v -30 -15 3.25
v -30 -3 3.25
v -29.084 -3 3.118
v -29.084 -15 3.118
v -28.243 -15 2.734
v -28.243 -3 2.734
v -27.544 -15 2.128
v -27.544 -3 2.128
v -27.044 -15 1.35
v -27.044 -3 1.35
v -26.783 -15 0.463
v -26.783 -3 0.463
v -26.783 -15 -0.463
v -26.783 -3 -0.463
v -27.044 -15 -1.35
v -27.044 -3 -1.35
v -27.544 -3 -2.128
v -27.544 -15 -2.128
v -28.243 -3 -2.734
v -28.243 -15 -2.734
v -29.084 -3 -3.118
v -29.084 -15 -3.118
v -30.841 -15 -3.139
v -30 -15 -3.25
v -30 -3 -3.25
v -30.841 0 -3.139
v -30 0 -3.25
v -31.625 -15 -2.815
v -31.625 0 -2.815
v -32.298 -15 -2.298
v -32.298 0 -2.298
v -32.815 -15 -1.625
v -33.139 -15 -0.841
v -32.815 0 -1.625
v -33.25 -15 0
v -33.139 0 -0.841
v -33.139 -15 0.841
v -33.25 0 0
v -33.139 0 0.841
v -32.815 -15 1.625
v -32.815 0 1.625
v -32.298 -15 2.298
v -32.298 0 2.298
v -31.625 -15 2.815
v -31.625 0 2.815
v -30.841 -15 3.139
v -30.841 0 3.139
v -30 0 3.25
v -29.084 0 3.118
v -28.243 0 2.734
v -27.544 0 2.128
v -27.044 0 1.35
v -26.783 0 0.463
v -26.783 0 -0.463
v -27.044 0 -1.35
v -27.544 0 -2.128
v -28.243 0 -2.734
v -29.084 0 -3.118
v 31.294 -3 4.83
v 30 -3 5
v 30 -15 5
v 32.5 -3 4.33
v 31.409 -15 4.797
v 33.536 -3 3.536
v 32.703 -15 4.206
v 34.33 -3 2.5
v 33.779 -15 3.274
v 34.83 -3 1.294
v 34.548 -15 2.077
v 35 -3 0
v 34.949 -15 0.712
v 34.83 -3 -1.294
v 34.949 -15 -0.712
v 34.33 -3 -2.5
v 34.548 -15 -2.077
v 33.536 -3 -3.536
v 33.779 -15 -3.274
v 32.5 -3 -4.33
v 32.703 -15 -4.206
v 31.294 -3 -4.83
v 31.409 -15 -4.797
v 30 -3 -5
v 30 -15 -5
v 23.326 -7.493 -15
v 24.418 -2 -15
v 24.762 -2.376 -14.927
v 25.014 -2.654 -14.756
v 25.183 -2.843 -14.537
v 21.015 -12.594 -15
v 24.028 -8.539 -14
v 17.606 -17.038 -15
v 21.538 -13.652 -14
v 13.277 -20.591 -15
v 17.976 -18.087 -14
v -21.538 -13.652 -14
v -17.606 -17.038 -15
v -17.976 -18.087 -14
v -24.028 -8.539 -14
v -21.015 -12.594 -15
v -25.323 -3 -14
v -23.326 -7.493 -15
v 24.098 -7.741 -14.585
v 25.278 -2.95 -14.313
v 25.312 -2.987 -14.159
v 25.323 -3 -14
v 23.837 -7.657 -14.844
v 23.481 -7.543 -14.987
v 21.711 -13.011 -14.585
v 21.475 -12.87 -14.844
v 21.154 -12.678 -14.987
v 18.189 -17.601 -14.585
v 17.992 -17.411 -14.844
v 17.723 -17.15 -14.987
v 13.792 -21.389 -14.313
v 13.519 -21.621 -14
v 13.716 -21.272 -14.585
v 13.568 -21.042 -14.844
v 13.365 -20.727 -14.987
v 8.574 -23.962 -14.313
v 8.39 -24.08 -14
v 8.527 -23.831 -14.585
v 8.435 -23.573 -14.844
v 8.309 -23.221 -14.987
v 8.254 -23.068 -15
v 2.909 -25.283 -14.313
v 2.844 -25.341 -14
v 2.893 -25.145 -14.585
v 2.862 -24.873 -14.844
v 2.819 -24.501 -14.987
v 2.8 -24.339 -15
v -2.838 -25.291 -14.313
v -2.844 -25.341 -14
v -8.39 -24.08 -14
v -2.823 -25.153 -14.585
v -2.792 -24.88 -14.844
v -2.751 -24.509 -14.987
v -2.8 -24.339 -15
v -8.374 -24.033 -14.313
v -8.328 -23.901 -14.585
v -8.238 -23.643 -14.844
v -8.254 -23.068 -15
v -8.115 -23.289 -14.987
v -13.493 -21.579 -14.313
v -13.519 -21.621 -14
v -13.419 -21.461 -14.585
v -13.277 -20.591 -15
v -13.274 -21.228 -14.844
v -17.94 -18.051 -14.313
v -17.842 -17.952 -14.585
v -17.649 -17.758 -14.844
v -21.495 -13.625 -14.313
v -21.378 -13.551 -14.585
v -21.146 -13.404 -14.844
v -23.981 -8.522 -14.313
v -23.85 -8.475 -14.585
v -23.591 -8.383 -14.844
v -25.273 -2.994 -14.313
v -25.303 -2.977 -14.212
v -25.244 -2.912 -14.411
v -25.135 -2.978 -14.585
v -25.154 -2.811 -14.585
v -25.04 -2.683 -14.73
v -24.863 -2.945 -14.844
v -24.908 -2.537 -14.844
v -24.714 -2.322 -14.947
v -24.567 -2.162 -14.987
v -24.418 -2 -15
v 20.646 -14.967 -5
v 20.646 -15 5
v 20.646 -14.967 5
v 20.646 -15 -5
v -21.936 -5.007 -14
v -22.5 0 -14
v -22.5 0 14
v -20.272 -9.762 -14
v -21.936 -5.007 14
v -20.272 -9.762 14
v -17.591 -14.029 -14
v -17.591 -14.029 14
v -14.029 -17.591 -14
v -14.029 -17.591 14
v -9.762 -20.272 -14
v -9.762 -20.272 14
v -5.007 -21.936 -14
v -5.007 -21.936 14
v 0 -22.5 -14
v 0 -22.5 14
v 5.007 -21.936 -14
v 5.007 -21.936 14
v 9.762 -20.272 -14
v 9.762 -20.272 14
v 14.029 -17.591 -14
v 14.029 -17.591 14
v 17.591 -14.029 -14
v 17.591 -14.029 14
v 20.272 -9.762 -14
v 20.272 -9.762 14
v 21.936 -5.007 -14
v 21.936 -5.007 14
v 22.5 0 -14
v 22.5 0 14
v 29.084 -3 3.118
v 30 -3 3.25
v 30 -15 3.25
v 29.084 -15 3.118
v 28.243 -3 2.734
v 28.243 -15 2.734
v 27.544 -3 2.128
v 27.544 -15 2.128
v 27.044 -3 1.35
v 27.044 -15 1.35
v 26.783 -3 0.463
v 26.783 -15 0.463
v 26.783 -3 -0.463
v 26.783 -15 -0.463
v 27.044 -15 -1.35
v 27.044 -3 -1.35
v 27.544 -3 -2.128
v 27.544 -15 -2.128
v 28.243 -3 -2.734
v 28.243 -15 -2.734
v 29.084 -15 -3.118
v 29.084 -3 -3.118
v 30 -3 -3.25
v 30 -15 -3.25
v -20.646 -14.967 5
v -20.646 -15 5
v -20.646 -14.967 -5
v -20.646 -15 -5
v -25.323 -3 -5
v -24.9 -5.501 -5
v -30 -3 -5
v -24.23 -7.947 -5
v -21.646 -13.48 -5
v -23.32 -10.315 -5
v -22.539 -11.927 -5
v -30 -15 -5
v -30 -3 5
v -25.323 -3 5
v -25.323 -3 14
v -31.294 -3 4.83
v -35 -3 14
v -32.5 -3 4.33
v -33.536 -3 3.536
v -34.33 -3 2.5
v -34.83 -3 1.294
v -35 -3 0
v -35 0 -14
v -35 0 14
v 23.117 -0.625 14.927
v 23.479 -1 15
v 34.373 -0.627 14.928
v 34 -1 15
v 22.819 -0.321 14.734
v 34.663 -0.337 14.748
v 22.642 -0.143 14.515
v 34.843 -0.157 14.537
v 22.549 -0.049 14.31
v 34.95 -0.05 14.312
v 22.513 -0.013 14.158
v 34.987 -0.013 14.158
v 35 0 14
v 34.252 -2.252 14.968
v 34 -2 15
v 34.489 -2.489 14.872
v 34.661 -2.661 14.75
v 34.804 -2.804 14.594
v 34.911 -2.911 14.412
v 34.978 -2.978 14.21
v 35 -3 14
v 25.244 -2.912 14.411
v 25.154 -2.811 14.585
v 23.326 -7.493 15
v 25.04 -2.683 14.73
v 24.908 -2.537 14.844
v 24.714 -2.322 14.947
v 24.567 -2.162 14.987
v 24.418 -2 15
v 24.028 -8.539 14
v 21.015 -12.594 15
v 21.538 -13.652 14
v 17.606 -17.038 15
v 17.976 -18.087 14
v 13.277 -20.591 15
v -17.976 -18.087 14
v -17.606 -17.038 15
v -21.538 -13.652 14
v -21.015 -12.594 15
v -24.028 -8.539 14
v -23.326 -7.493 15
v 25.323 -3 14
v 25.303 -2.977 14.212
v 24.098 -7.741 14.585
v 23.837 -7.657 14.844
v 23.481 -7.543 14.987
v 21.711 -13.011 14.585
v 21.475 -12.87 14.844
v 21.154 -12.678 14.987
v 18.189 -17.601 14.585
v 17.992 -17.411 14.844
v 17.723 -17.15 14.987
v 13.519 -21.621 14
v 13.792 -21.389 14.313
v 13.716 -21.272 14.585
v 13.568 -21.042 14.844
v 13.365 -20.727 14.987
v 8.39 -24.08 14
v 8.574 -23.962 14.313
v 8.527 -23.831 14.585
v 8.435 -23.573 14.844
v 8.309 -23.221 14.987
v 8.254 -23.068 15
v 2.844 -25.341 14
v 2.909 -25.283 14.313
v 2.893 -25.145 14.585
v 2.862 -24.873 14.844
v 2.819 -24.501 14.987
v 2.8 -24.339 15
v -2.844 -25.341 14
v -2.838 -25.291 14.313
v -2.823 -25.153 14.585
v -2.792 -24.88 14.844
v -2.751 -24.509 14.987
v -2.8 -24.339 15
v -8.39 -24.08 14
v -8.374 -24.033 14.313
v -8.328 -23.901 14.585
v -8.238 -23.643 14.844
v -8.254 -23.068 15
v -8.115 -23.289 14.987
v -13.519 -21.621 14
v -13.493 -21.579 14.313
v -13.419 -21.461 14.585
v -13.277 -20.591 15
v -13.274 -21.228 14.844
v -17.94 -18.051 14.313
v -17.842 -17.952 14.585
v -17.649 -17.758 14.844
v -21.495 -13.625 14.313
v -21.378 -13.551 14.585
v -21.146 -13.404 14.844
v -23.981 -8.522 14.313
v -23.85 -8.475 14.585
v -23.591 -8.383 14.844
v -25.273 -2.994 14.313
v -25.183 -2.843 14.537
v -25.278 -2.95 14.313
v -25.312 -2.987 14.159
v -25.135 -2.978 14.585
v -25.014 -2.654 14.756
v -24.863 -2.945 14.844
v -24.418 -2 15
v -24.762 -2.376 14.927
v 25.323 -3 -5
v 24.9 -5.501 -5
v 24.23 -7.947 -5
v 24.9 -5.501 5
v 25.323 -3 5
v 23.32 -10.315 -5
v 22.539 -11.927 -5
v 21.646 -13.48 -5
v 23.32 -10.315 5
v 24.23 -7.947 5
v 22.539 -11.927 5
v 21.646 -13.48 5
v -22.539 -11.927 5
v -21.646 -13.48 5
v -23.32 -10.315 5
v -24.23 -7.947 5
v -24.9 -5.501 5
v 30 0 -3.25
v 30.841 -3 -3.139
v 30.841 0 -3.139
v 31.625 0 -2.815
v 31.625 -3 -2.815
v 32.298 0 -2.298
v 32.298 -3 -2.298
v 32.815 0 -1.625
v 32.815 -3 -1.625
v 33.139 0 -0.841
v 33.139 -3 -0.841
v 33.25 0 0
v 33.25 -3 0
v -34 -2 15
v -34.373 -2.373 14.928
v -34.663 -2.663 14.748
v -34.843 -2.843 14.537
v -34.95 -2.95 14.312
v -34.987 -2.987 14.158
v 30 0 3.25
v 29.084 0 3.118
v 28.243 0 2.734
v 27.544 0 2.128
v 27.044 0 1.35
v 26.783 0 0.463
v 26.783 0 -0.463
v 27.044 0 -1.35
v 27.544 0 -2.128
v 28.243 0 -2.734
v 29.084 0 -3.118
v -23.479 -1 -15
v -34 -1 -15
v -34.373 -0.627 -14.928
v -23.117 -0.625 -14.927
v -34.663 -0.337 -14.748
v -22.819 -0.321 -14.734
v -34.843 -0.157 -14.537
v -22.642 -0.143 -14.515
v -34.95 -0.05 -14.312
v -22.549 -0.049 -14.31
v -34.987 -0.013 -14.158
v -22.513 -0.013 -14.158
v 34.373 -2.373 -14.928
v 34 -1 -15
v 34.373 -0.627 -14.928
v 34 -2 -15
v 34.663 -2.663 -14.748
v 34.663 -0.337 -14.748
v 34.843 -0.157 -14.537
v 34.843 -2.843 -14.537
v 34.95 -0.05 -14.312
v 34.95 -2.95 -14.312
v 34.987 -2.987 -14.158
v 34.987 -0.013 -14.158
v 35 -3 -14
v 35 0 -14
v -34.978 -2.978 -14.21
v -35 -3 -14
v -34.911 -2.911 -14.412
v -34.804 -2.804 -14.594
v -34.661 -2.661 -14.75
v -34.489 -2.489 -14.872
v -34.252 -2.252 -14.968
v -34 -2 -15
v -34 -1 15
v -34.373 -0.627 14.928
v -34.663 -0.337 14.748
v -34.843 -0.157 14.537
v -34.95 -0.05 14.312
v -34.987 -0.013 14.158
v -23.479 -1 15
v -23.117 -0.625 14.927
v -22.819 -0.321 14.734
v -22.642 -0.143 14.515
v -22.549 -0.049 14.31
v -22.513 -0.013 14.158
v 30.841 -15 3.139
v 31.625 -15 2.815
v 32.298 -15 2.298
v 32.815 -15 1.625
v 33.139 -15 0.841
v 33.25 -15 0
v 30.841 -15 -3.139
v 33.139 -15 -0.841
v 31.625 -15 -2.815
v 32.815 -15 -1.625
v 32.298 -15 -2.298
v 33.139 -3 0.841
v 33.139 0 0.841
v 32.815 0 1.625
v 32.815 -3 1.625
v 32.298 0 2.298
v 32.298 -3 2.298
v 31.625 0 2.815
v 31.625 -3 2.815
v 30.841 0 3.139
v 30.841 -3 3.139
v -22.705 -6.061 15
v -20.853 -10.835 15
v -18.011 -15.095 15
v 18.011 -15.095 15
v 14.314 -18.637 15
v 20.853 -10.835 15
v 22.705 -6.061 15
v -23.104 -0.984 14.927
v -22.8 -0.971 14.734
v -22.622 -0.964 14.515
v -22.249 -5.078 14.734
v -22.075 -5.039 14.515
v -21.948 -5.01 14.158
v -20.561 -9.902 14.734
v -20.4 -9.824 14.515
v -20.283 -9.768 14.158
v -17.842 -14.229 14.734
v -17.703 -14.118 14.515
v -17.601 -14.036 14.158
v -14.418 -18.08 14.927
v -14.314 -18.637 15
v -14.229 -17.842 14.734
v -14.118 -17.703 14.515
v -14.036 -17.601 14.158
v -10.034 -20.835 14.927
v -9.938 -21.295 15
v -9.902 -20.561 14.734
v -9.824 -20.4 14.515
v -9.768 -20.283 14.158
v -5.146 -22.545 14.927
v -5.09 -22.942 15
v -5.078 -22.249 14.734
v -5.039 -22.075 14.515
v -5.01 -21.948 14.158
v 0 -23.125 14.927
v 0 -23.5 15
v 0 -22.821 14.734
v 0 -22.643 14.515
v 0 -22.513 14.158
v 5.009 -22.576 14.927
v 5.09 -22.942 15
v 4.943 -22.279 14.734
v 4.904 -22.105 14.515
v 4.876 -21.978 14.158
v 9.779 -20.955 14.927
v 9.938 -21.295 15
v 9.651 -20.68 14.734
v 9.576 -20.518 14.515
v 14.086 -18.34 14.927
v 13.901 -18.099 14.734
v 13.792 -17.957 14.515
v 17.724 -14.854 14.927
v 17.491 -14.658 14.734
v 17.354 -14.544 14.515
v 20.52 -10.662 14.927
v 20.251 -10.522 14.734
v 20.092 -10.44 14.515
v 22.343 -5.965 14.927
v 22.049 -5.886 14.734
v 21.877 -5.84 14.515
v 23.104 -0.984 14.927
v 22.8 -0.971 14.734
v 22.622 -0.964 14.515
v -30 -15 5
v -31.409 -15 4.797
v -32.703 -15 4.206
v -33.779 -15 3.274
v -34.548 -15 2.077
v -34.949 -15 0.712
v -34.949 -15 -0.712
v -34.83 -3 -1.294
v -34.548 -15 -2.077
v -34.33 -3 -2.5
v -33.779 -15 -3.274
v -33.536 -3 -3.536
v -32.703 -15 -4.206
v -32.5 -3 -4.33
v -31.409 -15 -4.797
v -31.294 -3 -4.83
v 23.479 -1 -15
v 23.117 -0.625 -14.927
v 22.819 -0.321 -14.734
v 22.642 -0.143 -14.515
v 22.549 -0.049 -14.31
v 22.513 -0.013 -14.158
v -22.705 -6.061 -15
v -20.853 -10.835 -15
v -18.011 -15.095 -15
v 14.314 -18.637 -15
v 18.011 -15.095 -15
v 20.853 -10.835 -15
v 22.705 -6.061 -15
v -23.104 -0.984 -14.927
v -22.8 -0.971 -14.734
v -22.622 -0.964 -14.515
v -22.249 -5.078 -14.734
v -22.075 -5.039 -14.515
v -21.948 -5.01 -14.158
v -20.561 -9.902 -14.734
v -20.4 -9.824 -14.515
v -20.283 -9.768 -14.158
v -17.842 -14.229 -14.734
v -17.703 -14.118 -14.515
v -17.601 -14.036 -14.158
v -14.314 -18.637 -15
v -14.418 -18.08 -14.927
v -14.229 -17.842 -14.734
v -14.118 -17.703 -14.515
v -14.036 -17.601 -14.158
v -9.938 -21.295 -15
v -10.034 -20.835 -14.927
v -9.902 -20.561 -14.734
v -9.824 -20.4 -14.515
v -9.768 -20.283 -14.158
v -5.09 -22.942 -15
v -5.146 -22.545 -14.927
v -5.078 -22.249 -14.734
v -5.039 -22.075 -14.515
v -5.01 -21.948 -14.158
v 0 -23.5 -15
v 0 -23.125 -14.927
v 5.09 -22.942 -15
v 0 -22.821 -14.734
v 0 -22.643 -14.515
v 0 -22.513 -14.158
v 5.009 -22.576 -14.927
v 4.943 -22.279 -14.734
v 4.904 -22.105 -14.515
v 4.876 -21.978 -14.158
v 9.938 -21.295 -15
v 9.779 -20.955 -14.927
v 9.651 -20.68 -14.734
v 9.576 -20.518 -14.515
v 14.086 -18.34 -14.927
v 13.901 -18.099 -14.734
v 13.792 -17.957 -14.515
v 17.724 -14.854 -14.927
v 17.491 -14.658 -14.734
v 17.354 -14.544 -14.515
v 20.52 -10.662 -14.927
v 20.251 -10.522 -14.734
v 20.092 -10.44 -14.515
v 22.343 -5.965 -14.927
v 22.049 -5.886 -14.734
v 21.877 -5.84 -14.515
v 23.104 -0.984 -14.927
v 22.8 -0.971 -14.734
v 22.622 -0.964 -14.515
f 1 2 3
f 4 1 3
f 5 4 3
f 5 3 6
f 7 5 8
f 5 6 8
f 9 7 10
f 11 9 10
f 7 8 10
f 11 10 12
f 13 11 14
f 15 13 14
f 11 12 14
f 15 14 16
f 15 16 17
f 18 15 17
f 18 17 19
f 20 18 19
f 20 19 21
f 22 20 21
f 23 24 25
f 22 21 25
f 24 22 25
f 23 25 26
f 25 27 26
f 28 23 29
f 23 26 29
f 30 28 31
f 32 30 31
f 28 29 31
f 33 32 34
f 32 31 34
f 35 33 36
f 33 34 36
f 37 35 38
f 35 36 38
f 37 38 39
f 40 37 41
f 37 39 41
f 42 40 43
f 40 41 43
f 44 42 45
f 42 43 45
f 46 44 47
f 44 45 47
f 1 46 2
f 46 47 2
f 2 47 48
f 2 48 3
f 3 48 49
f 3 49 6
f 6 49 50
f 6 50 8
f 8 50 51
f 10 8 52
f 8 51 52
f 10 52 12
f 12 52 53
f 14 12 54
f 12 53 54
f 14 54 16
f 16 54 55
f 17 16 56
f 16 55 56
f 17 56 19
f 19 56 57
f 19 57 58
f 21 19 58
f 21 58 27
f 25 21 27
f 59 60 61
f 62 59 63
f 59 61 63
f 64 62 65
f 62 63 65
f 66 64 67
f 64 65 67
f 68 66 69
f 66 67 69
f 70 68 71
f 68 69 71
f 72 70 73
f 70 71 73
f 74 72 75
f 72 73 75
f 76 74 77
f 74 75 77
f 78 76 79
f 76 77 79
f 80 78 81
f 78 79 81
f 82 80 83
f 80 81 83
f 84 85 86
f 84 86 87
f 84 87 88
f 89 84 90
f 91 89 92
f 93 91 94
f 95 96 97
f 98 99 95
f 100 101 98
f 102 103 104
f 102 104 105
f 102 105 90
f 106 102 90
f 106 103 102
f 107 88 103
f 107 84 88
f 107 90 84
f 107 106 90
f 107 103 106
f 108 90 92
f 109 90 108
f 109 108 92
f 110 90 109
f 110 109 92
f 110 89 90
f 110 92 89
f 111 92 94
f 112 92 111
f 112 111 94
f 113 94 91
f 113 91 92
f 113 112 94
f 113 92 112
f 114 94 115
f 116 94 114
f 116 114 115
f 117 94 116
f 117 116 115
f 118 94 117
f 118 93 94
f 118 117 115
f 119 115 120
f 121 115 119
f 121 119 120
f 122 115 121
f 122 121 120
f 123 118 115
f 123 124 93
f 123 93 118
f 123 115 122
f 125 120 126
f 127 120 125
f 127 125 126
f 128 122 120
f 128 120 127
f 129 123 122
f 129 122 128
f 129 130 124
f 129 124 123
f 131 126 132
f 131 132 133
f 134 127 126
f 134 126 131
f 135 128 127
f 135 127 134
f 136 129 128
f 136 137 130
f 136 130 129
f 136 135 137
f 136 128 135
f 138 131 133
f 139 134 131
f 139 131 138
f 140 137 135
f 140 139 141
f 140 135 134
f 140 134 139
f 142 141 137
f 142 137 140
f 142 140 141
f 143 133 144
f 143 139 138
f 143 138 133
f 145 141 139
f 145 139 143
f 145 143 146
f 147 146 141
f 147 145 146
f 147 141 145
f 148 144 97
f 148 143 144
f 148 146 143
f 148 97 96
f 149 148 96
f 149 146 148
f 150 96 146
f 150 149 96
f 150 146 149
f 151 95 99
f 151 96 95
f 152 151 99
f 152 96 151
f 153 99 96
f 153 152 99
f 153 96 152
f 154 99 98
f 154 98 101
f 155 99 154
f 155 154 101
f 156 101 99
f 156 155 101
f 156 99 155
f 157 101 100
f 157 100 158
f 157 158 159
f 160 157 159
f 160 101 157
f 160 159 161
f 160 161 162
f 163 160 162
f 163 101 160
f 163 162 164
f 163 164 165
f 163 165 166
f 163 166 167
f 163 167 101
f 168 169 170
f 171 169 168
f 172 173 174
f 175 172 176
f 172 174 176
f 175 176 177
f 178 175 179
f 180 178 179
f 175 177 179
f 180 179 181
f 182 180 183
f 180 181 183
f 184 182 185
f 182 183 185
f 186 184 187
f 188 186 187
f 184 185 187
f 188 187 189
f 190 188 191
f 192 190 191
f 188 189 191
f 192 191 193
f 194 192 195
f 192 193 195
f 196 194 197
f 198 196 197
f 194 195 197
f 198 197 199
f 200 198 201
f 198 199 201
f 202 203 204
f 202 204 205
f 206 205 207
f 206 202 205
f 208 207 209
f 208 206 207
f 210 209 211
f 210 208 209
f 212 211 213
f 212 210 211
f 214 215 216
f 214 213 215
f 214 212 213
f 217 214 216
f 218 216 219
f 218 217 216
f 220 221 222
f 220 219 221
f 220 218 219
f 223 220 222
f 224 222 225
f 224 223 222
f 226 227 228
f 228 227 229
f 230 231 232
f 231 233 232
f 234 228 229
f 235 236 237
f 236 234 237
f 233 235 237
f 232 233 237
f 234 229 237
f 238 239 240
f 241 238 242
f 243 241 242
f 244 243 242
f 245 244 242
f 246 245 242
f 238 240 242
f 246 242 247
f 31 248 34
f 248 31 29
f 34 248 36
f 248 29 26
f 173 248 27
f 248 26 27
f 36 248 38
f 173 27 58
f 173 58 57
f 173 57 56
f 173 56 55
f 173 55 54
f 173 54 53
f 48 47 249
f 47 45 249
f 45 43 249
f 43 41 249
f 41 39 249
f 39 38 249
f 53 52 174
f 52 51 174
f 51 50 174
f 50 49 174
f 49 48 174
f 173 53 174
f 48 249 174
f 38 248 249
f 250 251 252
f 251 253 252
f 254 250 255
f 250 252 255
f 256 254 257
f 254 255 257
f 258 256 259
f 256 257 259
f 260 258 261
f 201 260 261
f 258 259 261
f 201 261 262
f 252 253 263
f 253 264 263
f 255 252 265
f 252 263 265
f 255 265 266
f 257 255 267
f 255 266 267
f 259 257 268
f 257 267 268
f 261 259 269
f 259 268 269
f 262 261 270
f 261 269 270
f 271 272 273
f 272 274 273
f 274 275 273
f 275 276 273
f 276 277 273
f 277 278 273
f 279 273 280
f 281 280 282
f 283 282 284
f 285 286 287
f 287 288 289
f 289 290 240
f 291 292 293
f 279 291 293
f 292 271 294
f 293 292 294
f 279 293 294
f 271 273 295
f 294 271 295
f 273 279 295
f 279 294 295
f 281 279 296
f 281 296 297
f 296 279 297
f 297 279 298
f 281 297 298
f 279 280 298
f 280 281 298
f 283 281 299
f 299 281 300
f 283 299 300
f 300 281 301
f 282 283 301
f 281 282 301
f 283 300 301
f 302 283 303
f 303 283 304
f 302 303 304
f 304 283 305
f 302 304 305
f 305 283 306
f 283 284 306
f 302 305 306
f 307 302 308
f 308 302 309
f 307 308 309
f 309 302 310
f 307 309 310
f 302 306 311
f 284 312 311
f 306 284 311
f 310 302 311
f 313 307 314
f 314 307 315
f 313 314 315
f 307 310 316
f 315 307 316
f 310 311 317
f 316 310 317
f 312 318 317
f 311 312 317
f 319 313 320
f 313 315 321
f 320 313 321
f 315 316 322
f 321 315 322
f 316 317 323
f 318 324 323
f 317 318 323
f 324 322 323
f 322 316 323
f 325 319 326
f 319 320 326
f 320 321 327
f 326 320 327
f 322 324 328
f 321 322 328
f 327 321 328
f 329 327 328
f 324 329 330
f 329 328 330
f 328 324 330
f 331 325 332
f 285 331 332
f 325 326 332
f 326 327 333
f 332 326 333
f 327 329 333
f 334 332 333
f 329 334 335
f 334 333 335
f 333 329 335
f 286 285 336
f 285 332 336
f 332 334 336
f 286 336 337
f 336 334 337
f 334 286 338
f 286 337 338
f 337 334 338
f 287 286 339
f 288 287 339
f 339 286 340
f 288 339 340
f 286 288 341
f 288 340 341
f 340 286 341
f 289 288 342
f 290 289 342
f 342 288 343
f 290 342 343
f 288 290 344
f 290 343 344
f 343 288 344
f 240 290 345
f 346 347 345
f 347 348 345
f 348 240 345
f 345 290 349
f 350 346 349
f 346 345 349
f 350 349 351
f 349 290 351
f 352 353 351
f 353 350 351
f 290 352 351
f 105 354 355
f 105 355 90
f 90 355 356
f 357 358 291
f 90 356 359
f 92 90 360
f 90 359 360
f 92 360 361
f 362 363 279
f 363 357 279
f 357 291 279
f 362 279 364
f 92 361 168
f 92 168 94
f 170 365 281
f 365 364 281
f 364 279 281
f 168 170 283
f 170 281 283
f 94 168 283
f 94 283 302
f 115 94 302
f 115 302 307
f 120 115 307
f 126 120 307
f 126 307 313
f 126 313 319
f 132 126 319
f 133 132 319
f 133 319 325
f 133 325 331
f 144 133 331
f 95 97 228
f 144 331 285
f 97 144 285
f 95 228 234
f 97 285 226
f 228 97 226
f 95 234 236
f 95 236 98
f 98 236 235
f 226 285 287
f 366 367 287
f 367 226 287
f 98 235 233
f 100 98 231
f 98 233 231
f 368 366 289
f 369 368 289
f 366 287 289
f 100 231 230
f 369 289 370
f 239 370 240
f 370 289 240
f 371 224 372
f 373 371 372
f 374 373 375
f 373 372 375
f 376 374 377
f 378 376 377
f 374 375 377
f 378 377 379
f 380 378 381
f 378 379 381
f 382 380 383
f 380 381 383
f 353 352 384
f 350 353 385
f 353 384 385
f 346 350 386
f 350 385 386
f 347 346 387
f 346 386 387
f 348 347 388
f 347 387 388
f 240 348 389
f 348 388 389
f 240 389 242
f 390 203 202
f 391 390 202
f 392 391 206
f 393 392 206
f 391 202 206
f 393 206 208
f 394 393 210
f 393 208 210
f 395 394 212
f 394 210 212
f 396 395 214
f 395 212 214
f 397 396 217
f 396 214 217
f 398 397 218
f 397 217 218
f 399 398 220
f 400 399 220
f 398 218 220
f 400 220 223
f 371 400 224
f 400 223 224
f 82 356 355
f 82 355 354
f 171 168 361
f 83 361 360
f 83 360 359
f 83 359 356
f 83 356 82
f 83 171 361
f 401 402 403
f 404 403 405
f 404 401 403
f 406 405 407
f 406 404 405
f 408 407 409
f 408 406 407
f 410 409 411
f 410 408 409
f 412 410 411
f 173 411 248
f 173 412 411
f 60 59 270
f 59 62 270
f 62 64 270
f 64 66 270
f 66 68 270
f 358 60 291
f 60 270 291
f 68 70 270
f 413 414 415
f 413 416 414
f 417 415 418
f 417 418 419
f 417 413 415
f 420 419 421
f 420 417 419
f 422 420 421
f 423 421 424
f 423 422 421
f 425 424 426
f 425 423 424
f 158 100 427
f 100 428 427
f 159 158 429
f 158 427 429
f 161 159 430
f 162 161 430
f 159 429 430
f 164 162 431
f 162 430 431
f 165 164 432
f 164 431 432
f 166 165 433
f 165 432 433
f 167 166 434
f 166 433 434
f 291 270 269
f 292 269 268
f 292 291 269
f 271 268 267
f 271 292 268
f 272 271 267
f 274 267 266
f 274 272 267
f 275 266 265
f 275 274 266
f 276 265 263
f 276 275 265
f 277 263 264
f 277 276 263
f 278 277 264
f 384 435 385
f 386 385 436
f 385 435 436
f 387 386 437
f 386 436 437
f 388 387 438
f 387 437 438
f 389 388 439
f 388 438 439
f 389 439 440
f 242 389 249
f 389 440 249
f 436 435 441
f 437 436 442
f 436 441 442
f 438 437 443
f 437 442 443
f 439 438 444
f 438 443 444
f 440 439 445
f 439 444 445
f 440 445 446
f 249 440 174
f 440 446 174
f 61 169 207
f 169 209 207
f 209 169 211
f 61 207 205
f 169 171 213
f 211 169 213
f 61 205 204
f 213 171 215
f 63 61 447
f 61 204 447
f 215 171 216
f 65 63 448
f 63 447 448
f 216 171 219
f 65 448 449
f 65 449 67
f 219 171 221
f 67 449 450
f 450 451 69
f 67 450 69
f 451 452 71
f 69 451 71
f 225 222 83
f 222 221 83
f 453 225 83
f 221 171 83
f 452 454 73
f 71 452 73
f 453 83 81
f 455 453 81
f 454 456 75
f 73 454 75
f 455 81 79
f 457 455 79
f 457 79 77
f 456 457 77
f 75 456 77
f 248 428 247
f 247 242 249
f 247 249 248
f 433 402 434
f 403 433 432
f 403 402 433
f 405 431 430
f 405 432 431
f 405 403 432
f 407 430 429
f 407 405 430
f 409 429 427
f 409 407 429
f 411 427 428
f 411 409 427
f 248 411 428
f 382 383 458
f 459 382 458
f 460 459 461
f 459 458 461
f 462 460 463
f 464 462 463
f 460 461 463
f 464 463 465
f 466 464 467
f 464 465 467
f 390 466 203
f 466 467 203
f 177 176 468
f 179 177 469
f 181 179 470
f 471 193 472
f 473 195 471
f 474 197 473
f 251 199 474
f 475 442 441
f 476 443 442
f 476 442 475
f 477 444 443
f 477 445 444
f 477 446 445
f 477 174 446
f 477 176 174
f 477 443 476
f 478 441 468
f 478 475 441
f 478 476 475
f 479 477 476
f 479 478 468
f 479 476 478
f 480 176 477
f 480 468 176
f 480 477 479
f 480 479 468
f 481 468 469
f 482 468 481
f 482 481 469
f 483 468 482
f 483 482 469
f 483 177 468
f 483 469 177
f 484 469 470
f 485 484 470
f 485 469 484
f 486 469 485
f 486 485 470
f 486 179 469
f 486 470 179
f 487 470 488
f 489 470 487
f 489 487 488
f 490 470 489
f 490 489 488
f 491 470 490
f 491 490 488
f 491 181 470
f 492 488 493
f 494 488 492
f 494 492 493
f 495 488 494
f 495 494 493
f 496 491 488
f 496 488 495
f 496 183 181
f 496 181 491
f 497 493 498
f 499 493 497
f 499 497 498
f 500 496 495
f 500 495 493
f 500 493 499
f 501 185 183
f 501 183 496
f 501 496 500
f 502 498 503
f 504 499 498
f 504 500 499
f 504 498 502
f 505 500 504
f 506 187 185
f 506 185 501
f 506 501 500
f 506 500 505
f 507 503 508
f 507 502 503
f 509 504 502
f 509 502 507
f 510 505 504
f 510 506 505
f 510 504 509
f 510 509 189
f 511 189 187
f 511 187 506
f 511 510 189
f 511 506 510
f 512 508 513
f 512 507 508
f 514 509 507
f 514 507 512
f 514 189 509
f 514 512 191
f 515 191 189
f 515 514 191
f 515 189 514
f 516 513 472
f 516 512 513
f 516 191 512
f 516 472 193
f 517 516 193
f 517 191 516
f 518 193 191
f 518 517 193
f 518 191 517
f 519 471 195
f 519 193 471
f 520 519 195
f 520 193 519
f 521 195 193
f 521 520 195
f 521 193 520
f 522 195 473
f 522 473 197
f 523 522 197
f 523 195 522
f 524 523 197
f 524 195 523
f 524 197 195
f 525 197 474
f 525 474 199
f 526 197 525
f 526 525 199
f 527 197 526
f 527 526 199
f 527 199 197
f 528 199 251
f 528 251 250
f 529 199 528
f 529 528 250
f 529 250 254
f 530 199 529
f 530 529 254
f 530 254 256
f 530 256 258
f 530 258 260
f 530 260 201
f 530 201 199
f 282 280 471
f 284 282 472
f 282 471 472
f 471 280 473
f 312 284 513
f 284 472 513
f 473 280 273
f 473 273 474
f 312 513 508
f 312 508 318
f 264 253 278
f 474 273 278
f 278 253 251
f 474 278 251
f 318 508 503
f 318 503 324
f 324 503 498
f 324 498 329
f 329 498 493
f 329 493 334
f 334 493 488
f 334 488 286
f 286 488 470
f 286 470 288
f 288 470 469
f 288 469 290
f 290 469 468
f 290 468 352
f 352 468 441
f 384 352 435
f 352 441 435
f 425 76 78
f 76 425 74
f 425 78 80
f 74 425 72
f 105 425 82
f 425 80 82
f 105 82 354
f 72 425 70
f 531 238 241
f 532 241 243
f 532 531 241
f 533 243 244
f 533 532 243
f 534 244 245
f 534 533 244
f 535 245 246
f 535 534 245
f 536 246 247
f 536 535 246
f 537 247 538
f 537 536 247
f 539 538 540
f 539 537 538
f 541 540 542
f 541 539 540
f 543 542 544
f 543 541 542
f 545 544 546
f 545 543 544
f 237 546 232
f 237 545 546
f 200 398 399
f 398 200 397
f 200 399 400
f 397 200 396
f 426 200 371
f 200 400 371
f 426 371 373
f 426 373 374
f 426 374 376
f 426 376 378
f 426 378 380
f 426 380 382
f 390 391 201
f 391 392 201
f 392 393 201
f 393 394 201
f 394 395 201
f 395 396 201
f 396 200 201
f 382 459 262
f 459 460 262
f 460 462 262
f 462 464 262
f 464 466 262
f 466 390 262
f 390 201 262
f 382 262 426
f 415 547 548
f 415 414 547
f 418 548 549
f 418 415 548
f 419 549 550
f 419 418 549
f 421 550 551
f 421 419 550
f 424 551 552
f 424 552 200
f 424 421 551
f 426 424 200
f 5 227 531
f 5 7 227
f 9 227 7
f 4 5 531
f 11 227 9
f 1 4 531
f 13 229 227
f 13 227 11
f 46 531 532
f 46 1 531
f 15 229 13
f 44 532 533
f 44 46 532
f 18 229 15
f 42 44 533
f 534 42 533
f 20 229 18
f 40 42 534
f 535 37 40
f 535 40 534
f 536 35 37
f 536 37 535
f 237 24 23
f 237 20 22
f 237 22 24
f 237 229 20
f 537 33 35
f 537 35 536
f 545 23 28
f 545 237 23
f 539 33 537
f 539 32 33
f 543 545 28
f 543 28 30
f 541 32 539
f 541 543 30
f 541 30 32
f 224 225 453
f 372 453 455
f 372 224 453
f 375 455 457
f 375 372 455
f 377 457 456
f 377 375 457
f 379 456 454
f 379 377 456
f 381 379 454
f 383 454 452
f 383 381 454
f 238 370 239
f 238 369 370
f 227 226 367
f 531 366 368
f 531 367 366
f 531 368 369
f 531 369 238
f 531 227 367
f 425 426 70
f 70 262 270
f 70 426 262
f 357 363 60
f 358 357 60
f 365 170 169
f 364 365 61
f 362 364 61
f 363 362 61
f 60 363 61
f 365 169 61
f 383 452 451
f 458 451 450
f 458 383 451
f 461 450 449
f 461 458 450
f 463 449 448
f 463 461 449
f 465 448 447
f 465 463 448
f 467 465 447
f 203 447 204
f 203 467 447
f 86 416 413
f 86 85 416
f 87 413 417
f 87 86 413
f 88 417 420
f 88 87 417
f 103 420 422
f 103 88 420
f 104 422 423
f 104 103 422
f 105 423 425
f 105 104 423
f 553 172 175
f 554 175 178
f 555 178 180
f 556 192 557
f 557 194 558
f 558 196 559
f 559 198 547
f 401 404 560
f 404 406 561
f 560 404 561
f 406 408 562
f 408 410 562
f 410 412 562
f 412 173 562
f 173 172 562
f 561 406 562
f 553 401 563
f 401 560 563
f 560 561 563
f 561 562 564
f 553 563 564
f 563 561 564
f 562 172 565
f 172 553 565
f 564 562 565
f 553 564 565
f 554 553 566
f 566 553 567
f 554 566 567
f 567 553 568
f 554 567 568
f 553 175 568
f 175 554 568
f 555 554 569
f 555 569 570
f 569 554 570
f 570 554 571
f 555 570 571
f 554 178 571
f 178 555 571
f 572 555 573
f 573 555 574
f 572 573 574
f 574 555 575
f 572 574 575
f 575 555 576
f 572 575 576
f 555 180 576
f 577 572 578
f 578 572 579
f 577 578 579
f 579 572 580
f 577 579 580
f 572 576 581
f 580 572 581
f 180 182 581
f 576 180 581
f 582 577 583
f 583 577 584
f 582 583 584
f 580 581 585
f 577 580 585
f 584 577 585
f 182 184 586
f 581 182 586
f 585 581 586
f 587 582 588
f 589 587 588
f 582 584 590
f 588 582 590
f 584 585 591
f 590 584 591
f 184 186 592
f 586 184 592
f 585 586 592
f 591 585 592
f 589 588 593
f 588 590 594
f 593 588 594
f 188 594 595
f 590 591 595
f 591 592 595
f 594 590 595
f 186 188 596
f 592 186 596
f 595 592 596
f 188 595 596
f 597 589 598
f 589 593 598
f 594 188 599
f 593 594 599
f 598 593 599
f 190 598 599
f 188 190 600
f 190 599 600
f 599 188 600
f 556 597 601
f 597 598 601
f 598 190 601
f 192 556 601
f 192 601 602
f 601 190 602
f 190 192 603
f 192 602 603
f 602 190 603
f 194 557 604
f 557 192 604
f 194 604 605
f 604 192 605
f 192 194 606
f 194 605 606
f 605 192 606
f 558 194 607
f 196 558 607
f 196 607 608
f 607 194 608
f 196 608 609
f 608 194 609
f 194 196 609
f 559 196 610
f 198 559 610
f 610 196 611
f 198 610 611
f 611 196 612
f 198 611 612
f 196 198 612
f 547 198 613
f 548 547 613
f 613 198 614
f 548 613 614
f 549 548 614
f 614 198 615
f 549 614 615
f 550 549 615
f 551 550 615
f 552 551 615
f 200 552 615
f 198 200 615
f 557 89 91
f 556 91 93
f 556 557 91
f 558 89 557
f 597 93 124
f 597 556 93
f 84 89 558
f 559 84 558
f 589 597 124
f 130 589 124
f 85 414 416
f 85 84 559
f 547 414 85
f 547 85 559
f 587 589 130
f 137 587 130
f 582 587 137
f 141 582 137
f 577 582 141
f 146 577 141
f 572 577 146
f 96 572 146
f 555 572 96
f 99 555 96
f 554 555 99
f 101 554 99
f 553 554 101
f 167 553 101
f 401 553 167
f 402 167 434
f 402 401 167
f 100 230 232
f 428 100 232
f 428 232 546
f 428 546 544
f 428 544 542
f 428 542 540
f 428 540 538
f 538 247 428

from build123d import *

# Parameters (mm, degrees)
BOSS_EXTRUDE1_DEPTH = 15
BOSS_EXTRUDE5_REACH = 58.23
BOSS_EXTRUDE5_START = 12
SKETCH4_5_R         = 3.25
CUT_EXTRUDE1_DEPTH  = 45.229515032
FILLET1_R           = 1


with BuildPart() as part:
    # Sketch1 → Boss-Extrude1 (new, symmetric)
    with BuildSketch(Plane.XY):
        with BuildLine():
            Line((-35, 0), (-22.5, 0))
            ThreePointArc((-22.5, 0), (0, -22.5), (22.5, 0))
            Line((22.5, 0), (35, 0))
            Line((35, 0), (35, -3))
            Line((35, -3), (25.322914524, -3))
            ThreePointArc((25.322914524, -3), (0, -25.5), (-25.322914524, -3))
            Line((-25.322914524, -3), (-35, -3))
            Line((-35, -3), (-35, 0))
        make_face()
    extrude(amount=BOSS_EXTRUDE1_DEPTH, both=True)

    # Sketch4 → Boss-Extrude5 (add, up to next)
    with BuildSketch(Plane.XZ.offset(3).offset(BOSS_EXTRUDE5_START), mode=Mode.PRIVATE) as boss_extrude5_sk1:
        with BuildLine():
            Line((20.645829048, 5), (20.645829048, -5))
            Line((20.645829048, -5), (30, -5))
            ThreePointArc((30, -5), (35, 0), (30, 5))
            Line((30, 5), (20.645829048, 5))
        make_face()
    boss_extrude5_tool1 = extrude(boss_extrude5_sk1.sketch, amount=-BOSS_EXTRUDE5_REACH, mode=Mode.PRIVATE) - part.part
    boss_extrude5 = boss_extrude5_tool1.solids().sort_by_distance((27.333296, -15, 0))[0]
    add(boss_extrude5)

    # Sketch4<5> → Cut-Extrude1 (cut, symmetric)
    with BuildSketch(Plane.XZ.offset(3)):
        with Locations((30, 0)):
            Circle(SKETCH4_5_R)
    cut_extrude1 = extrude(amount=CUT_EXTRUDE1_DEPTH, both=True, mode=Mode.SUBTRACT)

    # Mirror1: Boss-Extrude5, Cut-Extrude1 across plane
    add(boss_extrude5.mirror(Plane(origin=(0, 0, 0), x_dir=(0, 0, 1), z_dir=(1, 0, 0))))
    add(cut_extrude1.mirror(Plane(origin=(0, 0, 0), x_dir=(0, 0, 1), z_dir=(1, 0, 0))), mode=Mode.SUBTRACT)

    # Fillet1
    fillet1_edges = [part.edges().sort_by_distance(p)[0] for p in [
        (28.75, 0, 15),
        (35, -1.5, 15),
        (30.161457262, -3, 15),
        (0, -25.5, 15),
        (-30.161457262, -3, 15),
        (-35, -1.5, 15),
        (-28.75, 0, 15),
        (0, -22.5, 15),
        (-28.75, 0, -15),
        (-35, -1.5, -15),
        (-30.161457262, -3, -15),
        (0, -25.5, -15),
        (30.161457262, -3, -15),
        (35, -1.5, -15),
        (28.75, 0, -15),
        (0, -22.5, -15),
    ]]
    fillet(fillet1_edges, radius=FILLET1_R)


solid = part.part
